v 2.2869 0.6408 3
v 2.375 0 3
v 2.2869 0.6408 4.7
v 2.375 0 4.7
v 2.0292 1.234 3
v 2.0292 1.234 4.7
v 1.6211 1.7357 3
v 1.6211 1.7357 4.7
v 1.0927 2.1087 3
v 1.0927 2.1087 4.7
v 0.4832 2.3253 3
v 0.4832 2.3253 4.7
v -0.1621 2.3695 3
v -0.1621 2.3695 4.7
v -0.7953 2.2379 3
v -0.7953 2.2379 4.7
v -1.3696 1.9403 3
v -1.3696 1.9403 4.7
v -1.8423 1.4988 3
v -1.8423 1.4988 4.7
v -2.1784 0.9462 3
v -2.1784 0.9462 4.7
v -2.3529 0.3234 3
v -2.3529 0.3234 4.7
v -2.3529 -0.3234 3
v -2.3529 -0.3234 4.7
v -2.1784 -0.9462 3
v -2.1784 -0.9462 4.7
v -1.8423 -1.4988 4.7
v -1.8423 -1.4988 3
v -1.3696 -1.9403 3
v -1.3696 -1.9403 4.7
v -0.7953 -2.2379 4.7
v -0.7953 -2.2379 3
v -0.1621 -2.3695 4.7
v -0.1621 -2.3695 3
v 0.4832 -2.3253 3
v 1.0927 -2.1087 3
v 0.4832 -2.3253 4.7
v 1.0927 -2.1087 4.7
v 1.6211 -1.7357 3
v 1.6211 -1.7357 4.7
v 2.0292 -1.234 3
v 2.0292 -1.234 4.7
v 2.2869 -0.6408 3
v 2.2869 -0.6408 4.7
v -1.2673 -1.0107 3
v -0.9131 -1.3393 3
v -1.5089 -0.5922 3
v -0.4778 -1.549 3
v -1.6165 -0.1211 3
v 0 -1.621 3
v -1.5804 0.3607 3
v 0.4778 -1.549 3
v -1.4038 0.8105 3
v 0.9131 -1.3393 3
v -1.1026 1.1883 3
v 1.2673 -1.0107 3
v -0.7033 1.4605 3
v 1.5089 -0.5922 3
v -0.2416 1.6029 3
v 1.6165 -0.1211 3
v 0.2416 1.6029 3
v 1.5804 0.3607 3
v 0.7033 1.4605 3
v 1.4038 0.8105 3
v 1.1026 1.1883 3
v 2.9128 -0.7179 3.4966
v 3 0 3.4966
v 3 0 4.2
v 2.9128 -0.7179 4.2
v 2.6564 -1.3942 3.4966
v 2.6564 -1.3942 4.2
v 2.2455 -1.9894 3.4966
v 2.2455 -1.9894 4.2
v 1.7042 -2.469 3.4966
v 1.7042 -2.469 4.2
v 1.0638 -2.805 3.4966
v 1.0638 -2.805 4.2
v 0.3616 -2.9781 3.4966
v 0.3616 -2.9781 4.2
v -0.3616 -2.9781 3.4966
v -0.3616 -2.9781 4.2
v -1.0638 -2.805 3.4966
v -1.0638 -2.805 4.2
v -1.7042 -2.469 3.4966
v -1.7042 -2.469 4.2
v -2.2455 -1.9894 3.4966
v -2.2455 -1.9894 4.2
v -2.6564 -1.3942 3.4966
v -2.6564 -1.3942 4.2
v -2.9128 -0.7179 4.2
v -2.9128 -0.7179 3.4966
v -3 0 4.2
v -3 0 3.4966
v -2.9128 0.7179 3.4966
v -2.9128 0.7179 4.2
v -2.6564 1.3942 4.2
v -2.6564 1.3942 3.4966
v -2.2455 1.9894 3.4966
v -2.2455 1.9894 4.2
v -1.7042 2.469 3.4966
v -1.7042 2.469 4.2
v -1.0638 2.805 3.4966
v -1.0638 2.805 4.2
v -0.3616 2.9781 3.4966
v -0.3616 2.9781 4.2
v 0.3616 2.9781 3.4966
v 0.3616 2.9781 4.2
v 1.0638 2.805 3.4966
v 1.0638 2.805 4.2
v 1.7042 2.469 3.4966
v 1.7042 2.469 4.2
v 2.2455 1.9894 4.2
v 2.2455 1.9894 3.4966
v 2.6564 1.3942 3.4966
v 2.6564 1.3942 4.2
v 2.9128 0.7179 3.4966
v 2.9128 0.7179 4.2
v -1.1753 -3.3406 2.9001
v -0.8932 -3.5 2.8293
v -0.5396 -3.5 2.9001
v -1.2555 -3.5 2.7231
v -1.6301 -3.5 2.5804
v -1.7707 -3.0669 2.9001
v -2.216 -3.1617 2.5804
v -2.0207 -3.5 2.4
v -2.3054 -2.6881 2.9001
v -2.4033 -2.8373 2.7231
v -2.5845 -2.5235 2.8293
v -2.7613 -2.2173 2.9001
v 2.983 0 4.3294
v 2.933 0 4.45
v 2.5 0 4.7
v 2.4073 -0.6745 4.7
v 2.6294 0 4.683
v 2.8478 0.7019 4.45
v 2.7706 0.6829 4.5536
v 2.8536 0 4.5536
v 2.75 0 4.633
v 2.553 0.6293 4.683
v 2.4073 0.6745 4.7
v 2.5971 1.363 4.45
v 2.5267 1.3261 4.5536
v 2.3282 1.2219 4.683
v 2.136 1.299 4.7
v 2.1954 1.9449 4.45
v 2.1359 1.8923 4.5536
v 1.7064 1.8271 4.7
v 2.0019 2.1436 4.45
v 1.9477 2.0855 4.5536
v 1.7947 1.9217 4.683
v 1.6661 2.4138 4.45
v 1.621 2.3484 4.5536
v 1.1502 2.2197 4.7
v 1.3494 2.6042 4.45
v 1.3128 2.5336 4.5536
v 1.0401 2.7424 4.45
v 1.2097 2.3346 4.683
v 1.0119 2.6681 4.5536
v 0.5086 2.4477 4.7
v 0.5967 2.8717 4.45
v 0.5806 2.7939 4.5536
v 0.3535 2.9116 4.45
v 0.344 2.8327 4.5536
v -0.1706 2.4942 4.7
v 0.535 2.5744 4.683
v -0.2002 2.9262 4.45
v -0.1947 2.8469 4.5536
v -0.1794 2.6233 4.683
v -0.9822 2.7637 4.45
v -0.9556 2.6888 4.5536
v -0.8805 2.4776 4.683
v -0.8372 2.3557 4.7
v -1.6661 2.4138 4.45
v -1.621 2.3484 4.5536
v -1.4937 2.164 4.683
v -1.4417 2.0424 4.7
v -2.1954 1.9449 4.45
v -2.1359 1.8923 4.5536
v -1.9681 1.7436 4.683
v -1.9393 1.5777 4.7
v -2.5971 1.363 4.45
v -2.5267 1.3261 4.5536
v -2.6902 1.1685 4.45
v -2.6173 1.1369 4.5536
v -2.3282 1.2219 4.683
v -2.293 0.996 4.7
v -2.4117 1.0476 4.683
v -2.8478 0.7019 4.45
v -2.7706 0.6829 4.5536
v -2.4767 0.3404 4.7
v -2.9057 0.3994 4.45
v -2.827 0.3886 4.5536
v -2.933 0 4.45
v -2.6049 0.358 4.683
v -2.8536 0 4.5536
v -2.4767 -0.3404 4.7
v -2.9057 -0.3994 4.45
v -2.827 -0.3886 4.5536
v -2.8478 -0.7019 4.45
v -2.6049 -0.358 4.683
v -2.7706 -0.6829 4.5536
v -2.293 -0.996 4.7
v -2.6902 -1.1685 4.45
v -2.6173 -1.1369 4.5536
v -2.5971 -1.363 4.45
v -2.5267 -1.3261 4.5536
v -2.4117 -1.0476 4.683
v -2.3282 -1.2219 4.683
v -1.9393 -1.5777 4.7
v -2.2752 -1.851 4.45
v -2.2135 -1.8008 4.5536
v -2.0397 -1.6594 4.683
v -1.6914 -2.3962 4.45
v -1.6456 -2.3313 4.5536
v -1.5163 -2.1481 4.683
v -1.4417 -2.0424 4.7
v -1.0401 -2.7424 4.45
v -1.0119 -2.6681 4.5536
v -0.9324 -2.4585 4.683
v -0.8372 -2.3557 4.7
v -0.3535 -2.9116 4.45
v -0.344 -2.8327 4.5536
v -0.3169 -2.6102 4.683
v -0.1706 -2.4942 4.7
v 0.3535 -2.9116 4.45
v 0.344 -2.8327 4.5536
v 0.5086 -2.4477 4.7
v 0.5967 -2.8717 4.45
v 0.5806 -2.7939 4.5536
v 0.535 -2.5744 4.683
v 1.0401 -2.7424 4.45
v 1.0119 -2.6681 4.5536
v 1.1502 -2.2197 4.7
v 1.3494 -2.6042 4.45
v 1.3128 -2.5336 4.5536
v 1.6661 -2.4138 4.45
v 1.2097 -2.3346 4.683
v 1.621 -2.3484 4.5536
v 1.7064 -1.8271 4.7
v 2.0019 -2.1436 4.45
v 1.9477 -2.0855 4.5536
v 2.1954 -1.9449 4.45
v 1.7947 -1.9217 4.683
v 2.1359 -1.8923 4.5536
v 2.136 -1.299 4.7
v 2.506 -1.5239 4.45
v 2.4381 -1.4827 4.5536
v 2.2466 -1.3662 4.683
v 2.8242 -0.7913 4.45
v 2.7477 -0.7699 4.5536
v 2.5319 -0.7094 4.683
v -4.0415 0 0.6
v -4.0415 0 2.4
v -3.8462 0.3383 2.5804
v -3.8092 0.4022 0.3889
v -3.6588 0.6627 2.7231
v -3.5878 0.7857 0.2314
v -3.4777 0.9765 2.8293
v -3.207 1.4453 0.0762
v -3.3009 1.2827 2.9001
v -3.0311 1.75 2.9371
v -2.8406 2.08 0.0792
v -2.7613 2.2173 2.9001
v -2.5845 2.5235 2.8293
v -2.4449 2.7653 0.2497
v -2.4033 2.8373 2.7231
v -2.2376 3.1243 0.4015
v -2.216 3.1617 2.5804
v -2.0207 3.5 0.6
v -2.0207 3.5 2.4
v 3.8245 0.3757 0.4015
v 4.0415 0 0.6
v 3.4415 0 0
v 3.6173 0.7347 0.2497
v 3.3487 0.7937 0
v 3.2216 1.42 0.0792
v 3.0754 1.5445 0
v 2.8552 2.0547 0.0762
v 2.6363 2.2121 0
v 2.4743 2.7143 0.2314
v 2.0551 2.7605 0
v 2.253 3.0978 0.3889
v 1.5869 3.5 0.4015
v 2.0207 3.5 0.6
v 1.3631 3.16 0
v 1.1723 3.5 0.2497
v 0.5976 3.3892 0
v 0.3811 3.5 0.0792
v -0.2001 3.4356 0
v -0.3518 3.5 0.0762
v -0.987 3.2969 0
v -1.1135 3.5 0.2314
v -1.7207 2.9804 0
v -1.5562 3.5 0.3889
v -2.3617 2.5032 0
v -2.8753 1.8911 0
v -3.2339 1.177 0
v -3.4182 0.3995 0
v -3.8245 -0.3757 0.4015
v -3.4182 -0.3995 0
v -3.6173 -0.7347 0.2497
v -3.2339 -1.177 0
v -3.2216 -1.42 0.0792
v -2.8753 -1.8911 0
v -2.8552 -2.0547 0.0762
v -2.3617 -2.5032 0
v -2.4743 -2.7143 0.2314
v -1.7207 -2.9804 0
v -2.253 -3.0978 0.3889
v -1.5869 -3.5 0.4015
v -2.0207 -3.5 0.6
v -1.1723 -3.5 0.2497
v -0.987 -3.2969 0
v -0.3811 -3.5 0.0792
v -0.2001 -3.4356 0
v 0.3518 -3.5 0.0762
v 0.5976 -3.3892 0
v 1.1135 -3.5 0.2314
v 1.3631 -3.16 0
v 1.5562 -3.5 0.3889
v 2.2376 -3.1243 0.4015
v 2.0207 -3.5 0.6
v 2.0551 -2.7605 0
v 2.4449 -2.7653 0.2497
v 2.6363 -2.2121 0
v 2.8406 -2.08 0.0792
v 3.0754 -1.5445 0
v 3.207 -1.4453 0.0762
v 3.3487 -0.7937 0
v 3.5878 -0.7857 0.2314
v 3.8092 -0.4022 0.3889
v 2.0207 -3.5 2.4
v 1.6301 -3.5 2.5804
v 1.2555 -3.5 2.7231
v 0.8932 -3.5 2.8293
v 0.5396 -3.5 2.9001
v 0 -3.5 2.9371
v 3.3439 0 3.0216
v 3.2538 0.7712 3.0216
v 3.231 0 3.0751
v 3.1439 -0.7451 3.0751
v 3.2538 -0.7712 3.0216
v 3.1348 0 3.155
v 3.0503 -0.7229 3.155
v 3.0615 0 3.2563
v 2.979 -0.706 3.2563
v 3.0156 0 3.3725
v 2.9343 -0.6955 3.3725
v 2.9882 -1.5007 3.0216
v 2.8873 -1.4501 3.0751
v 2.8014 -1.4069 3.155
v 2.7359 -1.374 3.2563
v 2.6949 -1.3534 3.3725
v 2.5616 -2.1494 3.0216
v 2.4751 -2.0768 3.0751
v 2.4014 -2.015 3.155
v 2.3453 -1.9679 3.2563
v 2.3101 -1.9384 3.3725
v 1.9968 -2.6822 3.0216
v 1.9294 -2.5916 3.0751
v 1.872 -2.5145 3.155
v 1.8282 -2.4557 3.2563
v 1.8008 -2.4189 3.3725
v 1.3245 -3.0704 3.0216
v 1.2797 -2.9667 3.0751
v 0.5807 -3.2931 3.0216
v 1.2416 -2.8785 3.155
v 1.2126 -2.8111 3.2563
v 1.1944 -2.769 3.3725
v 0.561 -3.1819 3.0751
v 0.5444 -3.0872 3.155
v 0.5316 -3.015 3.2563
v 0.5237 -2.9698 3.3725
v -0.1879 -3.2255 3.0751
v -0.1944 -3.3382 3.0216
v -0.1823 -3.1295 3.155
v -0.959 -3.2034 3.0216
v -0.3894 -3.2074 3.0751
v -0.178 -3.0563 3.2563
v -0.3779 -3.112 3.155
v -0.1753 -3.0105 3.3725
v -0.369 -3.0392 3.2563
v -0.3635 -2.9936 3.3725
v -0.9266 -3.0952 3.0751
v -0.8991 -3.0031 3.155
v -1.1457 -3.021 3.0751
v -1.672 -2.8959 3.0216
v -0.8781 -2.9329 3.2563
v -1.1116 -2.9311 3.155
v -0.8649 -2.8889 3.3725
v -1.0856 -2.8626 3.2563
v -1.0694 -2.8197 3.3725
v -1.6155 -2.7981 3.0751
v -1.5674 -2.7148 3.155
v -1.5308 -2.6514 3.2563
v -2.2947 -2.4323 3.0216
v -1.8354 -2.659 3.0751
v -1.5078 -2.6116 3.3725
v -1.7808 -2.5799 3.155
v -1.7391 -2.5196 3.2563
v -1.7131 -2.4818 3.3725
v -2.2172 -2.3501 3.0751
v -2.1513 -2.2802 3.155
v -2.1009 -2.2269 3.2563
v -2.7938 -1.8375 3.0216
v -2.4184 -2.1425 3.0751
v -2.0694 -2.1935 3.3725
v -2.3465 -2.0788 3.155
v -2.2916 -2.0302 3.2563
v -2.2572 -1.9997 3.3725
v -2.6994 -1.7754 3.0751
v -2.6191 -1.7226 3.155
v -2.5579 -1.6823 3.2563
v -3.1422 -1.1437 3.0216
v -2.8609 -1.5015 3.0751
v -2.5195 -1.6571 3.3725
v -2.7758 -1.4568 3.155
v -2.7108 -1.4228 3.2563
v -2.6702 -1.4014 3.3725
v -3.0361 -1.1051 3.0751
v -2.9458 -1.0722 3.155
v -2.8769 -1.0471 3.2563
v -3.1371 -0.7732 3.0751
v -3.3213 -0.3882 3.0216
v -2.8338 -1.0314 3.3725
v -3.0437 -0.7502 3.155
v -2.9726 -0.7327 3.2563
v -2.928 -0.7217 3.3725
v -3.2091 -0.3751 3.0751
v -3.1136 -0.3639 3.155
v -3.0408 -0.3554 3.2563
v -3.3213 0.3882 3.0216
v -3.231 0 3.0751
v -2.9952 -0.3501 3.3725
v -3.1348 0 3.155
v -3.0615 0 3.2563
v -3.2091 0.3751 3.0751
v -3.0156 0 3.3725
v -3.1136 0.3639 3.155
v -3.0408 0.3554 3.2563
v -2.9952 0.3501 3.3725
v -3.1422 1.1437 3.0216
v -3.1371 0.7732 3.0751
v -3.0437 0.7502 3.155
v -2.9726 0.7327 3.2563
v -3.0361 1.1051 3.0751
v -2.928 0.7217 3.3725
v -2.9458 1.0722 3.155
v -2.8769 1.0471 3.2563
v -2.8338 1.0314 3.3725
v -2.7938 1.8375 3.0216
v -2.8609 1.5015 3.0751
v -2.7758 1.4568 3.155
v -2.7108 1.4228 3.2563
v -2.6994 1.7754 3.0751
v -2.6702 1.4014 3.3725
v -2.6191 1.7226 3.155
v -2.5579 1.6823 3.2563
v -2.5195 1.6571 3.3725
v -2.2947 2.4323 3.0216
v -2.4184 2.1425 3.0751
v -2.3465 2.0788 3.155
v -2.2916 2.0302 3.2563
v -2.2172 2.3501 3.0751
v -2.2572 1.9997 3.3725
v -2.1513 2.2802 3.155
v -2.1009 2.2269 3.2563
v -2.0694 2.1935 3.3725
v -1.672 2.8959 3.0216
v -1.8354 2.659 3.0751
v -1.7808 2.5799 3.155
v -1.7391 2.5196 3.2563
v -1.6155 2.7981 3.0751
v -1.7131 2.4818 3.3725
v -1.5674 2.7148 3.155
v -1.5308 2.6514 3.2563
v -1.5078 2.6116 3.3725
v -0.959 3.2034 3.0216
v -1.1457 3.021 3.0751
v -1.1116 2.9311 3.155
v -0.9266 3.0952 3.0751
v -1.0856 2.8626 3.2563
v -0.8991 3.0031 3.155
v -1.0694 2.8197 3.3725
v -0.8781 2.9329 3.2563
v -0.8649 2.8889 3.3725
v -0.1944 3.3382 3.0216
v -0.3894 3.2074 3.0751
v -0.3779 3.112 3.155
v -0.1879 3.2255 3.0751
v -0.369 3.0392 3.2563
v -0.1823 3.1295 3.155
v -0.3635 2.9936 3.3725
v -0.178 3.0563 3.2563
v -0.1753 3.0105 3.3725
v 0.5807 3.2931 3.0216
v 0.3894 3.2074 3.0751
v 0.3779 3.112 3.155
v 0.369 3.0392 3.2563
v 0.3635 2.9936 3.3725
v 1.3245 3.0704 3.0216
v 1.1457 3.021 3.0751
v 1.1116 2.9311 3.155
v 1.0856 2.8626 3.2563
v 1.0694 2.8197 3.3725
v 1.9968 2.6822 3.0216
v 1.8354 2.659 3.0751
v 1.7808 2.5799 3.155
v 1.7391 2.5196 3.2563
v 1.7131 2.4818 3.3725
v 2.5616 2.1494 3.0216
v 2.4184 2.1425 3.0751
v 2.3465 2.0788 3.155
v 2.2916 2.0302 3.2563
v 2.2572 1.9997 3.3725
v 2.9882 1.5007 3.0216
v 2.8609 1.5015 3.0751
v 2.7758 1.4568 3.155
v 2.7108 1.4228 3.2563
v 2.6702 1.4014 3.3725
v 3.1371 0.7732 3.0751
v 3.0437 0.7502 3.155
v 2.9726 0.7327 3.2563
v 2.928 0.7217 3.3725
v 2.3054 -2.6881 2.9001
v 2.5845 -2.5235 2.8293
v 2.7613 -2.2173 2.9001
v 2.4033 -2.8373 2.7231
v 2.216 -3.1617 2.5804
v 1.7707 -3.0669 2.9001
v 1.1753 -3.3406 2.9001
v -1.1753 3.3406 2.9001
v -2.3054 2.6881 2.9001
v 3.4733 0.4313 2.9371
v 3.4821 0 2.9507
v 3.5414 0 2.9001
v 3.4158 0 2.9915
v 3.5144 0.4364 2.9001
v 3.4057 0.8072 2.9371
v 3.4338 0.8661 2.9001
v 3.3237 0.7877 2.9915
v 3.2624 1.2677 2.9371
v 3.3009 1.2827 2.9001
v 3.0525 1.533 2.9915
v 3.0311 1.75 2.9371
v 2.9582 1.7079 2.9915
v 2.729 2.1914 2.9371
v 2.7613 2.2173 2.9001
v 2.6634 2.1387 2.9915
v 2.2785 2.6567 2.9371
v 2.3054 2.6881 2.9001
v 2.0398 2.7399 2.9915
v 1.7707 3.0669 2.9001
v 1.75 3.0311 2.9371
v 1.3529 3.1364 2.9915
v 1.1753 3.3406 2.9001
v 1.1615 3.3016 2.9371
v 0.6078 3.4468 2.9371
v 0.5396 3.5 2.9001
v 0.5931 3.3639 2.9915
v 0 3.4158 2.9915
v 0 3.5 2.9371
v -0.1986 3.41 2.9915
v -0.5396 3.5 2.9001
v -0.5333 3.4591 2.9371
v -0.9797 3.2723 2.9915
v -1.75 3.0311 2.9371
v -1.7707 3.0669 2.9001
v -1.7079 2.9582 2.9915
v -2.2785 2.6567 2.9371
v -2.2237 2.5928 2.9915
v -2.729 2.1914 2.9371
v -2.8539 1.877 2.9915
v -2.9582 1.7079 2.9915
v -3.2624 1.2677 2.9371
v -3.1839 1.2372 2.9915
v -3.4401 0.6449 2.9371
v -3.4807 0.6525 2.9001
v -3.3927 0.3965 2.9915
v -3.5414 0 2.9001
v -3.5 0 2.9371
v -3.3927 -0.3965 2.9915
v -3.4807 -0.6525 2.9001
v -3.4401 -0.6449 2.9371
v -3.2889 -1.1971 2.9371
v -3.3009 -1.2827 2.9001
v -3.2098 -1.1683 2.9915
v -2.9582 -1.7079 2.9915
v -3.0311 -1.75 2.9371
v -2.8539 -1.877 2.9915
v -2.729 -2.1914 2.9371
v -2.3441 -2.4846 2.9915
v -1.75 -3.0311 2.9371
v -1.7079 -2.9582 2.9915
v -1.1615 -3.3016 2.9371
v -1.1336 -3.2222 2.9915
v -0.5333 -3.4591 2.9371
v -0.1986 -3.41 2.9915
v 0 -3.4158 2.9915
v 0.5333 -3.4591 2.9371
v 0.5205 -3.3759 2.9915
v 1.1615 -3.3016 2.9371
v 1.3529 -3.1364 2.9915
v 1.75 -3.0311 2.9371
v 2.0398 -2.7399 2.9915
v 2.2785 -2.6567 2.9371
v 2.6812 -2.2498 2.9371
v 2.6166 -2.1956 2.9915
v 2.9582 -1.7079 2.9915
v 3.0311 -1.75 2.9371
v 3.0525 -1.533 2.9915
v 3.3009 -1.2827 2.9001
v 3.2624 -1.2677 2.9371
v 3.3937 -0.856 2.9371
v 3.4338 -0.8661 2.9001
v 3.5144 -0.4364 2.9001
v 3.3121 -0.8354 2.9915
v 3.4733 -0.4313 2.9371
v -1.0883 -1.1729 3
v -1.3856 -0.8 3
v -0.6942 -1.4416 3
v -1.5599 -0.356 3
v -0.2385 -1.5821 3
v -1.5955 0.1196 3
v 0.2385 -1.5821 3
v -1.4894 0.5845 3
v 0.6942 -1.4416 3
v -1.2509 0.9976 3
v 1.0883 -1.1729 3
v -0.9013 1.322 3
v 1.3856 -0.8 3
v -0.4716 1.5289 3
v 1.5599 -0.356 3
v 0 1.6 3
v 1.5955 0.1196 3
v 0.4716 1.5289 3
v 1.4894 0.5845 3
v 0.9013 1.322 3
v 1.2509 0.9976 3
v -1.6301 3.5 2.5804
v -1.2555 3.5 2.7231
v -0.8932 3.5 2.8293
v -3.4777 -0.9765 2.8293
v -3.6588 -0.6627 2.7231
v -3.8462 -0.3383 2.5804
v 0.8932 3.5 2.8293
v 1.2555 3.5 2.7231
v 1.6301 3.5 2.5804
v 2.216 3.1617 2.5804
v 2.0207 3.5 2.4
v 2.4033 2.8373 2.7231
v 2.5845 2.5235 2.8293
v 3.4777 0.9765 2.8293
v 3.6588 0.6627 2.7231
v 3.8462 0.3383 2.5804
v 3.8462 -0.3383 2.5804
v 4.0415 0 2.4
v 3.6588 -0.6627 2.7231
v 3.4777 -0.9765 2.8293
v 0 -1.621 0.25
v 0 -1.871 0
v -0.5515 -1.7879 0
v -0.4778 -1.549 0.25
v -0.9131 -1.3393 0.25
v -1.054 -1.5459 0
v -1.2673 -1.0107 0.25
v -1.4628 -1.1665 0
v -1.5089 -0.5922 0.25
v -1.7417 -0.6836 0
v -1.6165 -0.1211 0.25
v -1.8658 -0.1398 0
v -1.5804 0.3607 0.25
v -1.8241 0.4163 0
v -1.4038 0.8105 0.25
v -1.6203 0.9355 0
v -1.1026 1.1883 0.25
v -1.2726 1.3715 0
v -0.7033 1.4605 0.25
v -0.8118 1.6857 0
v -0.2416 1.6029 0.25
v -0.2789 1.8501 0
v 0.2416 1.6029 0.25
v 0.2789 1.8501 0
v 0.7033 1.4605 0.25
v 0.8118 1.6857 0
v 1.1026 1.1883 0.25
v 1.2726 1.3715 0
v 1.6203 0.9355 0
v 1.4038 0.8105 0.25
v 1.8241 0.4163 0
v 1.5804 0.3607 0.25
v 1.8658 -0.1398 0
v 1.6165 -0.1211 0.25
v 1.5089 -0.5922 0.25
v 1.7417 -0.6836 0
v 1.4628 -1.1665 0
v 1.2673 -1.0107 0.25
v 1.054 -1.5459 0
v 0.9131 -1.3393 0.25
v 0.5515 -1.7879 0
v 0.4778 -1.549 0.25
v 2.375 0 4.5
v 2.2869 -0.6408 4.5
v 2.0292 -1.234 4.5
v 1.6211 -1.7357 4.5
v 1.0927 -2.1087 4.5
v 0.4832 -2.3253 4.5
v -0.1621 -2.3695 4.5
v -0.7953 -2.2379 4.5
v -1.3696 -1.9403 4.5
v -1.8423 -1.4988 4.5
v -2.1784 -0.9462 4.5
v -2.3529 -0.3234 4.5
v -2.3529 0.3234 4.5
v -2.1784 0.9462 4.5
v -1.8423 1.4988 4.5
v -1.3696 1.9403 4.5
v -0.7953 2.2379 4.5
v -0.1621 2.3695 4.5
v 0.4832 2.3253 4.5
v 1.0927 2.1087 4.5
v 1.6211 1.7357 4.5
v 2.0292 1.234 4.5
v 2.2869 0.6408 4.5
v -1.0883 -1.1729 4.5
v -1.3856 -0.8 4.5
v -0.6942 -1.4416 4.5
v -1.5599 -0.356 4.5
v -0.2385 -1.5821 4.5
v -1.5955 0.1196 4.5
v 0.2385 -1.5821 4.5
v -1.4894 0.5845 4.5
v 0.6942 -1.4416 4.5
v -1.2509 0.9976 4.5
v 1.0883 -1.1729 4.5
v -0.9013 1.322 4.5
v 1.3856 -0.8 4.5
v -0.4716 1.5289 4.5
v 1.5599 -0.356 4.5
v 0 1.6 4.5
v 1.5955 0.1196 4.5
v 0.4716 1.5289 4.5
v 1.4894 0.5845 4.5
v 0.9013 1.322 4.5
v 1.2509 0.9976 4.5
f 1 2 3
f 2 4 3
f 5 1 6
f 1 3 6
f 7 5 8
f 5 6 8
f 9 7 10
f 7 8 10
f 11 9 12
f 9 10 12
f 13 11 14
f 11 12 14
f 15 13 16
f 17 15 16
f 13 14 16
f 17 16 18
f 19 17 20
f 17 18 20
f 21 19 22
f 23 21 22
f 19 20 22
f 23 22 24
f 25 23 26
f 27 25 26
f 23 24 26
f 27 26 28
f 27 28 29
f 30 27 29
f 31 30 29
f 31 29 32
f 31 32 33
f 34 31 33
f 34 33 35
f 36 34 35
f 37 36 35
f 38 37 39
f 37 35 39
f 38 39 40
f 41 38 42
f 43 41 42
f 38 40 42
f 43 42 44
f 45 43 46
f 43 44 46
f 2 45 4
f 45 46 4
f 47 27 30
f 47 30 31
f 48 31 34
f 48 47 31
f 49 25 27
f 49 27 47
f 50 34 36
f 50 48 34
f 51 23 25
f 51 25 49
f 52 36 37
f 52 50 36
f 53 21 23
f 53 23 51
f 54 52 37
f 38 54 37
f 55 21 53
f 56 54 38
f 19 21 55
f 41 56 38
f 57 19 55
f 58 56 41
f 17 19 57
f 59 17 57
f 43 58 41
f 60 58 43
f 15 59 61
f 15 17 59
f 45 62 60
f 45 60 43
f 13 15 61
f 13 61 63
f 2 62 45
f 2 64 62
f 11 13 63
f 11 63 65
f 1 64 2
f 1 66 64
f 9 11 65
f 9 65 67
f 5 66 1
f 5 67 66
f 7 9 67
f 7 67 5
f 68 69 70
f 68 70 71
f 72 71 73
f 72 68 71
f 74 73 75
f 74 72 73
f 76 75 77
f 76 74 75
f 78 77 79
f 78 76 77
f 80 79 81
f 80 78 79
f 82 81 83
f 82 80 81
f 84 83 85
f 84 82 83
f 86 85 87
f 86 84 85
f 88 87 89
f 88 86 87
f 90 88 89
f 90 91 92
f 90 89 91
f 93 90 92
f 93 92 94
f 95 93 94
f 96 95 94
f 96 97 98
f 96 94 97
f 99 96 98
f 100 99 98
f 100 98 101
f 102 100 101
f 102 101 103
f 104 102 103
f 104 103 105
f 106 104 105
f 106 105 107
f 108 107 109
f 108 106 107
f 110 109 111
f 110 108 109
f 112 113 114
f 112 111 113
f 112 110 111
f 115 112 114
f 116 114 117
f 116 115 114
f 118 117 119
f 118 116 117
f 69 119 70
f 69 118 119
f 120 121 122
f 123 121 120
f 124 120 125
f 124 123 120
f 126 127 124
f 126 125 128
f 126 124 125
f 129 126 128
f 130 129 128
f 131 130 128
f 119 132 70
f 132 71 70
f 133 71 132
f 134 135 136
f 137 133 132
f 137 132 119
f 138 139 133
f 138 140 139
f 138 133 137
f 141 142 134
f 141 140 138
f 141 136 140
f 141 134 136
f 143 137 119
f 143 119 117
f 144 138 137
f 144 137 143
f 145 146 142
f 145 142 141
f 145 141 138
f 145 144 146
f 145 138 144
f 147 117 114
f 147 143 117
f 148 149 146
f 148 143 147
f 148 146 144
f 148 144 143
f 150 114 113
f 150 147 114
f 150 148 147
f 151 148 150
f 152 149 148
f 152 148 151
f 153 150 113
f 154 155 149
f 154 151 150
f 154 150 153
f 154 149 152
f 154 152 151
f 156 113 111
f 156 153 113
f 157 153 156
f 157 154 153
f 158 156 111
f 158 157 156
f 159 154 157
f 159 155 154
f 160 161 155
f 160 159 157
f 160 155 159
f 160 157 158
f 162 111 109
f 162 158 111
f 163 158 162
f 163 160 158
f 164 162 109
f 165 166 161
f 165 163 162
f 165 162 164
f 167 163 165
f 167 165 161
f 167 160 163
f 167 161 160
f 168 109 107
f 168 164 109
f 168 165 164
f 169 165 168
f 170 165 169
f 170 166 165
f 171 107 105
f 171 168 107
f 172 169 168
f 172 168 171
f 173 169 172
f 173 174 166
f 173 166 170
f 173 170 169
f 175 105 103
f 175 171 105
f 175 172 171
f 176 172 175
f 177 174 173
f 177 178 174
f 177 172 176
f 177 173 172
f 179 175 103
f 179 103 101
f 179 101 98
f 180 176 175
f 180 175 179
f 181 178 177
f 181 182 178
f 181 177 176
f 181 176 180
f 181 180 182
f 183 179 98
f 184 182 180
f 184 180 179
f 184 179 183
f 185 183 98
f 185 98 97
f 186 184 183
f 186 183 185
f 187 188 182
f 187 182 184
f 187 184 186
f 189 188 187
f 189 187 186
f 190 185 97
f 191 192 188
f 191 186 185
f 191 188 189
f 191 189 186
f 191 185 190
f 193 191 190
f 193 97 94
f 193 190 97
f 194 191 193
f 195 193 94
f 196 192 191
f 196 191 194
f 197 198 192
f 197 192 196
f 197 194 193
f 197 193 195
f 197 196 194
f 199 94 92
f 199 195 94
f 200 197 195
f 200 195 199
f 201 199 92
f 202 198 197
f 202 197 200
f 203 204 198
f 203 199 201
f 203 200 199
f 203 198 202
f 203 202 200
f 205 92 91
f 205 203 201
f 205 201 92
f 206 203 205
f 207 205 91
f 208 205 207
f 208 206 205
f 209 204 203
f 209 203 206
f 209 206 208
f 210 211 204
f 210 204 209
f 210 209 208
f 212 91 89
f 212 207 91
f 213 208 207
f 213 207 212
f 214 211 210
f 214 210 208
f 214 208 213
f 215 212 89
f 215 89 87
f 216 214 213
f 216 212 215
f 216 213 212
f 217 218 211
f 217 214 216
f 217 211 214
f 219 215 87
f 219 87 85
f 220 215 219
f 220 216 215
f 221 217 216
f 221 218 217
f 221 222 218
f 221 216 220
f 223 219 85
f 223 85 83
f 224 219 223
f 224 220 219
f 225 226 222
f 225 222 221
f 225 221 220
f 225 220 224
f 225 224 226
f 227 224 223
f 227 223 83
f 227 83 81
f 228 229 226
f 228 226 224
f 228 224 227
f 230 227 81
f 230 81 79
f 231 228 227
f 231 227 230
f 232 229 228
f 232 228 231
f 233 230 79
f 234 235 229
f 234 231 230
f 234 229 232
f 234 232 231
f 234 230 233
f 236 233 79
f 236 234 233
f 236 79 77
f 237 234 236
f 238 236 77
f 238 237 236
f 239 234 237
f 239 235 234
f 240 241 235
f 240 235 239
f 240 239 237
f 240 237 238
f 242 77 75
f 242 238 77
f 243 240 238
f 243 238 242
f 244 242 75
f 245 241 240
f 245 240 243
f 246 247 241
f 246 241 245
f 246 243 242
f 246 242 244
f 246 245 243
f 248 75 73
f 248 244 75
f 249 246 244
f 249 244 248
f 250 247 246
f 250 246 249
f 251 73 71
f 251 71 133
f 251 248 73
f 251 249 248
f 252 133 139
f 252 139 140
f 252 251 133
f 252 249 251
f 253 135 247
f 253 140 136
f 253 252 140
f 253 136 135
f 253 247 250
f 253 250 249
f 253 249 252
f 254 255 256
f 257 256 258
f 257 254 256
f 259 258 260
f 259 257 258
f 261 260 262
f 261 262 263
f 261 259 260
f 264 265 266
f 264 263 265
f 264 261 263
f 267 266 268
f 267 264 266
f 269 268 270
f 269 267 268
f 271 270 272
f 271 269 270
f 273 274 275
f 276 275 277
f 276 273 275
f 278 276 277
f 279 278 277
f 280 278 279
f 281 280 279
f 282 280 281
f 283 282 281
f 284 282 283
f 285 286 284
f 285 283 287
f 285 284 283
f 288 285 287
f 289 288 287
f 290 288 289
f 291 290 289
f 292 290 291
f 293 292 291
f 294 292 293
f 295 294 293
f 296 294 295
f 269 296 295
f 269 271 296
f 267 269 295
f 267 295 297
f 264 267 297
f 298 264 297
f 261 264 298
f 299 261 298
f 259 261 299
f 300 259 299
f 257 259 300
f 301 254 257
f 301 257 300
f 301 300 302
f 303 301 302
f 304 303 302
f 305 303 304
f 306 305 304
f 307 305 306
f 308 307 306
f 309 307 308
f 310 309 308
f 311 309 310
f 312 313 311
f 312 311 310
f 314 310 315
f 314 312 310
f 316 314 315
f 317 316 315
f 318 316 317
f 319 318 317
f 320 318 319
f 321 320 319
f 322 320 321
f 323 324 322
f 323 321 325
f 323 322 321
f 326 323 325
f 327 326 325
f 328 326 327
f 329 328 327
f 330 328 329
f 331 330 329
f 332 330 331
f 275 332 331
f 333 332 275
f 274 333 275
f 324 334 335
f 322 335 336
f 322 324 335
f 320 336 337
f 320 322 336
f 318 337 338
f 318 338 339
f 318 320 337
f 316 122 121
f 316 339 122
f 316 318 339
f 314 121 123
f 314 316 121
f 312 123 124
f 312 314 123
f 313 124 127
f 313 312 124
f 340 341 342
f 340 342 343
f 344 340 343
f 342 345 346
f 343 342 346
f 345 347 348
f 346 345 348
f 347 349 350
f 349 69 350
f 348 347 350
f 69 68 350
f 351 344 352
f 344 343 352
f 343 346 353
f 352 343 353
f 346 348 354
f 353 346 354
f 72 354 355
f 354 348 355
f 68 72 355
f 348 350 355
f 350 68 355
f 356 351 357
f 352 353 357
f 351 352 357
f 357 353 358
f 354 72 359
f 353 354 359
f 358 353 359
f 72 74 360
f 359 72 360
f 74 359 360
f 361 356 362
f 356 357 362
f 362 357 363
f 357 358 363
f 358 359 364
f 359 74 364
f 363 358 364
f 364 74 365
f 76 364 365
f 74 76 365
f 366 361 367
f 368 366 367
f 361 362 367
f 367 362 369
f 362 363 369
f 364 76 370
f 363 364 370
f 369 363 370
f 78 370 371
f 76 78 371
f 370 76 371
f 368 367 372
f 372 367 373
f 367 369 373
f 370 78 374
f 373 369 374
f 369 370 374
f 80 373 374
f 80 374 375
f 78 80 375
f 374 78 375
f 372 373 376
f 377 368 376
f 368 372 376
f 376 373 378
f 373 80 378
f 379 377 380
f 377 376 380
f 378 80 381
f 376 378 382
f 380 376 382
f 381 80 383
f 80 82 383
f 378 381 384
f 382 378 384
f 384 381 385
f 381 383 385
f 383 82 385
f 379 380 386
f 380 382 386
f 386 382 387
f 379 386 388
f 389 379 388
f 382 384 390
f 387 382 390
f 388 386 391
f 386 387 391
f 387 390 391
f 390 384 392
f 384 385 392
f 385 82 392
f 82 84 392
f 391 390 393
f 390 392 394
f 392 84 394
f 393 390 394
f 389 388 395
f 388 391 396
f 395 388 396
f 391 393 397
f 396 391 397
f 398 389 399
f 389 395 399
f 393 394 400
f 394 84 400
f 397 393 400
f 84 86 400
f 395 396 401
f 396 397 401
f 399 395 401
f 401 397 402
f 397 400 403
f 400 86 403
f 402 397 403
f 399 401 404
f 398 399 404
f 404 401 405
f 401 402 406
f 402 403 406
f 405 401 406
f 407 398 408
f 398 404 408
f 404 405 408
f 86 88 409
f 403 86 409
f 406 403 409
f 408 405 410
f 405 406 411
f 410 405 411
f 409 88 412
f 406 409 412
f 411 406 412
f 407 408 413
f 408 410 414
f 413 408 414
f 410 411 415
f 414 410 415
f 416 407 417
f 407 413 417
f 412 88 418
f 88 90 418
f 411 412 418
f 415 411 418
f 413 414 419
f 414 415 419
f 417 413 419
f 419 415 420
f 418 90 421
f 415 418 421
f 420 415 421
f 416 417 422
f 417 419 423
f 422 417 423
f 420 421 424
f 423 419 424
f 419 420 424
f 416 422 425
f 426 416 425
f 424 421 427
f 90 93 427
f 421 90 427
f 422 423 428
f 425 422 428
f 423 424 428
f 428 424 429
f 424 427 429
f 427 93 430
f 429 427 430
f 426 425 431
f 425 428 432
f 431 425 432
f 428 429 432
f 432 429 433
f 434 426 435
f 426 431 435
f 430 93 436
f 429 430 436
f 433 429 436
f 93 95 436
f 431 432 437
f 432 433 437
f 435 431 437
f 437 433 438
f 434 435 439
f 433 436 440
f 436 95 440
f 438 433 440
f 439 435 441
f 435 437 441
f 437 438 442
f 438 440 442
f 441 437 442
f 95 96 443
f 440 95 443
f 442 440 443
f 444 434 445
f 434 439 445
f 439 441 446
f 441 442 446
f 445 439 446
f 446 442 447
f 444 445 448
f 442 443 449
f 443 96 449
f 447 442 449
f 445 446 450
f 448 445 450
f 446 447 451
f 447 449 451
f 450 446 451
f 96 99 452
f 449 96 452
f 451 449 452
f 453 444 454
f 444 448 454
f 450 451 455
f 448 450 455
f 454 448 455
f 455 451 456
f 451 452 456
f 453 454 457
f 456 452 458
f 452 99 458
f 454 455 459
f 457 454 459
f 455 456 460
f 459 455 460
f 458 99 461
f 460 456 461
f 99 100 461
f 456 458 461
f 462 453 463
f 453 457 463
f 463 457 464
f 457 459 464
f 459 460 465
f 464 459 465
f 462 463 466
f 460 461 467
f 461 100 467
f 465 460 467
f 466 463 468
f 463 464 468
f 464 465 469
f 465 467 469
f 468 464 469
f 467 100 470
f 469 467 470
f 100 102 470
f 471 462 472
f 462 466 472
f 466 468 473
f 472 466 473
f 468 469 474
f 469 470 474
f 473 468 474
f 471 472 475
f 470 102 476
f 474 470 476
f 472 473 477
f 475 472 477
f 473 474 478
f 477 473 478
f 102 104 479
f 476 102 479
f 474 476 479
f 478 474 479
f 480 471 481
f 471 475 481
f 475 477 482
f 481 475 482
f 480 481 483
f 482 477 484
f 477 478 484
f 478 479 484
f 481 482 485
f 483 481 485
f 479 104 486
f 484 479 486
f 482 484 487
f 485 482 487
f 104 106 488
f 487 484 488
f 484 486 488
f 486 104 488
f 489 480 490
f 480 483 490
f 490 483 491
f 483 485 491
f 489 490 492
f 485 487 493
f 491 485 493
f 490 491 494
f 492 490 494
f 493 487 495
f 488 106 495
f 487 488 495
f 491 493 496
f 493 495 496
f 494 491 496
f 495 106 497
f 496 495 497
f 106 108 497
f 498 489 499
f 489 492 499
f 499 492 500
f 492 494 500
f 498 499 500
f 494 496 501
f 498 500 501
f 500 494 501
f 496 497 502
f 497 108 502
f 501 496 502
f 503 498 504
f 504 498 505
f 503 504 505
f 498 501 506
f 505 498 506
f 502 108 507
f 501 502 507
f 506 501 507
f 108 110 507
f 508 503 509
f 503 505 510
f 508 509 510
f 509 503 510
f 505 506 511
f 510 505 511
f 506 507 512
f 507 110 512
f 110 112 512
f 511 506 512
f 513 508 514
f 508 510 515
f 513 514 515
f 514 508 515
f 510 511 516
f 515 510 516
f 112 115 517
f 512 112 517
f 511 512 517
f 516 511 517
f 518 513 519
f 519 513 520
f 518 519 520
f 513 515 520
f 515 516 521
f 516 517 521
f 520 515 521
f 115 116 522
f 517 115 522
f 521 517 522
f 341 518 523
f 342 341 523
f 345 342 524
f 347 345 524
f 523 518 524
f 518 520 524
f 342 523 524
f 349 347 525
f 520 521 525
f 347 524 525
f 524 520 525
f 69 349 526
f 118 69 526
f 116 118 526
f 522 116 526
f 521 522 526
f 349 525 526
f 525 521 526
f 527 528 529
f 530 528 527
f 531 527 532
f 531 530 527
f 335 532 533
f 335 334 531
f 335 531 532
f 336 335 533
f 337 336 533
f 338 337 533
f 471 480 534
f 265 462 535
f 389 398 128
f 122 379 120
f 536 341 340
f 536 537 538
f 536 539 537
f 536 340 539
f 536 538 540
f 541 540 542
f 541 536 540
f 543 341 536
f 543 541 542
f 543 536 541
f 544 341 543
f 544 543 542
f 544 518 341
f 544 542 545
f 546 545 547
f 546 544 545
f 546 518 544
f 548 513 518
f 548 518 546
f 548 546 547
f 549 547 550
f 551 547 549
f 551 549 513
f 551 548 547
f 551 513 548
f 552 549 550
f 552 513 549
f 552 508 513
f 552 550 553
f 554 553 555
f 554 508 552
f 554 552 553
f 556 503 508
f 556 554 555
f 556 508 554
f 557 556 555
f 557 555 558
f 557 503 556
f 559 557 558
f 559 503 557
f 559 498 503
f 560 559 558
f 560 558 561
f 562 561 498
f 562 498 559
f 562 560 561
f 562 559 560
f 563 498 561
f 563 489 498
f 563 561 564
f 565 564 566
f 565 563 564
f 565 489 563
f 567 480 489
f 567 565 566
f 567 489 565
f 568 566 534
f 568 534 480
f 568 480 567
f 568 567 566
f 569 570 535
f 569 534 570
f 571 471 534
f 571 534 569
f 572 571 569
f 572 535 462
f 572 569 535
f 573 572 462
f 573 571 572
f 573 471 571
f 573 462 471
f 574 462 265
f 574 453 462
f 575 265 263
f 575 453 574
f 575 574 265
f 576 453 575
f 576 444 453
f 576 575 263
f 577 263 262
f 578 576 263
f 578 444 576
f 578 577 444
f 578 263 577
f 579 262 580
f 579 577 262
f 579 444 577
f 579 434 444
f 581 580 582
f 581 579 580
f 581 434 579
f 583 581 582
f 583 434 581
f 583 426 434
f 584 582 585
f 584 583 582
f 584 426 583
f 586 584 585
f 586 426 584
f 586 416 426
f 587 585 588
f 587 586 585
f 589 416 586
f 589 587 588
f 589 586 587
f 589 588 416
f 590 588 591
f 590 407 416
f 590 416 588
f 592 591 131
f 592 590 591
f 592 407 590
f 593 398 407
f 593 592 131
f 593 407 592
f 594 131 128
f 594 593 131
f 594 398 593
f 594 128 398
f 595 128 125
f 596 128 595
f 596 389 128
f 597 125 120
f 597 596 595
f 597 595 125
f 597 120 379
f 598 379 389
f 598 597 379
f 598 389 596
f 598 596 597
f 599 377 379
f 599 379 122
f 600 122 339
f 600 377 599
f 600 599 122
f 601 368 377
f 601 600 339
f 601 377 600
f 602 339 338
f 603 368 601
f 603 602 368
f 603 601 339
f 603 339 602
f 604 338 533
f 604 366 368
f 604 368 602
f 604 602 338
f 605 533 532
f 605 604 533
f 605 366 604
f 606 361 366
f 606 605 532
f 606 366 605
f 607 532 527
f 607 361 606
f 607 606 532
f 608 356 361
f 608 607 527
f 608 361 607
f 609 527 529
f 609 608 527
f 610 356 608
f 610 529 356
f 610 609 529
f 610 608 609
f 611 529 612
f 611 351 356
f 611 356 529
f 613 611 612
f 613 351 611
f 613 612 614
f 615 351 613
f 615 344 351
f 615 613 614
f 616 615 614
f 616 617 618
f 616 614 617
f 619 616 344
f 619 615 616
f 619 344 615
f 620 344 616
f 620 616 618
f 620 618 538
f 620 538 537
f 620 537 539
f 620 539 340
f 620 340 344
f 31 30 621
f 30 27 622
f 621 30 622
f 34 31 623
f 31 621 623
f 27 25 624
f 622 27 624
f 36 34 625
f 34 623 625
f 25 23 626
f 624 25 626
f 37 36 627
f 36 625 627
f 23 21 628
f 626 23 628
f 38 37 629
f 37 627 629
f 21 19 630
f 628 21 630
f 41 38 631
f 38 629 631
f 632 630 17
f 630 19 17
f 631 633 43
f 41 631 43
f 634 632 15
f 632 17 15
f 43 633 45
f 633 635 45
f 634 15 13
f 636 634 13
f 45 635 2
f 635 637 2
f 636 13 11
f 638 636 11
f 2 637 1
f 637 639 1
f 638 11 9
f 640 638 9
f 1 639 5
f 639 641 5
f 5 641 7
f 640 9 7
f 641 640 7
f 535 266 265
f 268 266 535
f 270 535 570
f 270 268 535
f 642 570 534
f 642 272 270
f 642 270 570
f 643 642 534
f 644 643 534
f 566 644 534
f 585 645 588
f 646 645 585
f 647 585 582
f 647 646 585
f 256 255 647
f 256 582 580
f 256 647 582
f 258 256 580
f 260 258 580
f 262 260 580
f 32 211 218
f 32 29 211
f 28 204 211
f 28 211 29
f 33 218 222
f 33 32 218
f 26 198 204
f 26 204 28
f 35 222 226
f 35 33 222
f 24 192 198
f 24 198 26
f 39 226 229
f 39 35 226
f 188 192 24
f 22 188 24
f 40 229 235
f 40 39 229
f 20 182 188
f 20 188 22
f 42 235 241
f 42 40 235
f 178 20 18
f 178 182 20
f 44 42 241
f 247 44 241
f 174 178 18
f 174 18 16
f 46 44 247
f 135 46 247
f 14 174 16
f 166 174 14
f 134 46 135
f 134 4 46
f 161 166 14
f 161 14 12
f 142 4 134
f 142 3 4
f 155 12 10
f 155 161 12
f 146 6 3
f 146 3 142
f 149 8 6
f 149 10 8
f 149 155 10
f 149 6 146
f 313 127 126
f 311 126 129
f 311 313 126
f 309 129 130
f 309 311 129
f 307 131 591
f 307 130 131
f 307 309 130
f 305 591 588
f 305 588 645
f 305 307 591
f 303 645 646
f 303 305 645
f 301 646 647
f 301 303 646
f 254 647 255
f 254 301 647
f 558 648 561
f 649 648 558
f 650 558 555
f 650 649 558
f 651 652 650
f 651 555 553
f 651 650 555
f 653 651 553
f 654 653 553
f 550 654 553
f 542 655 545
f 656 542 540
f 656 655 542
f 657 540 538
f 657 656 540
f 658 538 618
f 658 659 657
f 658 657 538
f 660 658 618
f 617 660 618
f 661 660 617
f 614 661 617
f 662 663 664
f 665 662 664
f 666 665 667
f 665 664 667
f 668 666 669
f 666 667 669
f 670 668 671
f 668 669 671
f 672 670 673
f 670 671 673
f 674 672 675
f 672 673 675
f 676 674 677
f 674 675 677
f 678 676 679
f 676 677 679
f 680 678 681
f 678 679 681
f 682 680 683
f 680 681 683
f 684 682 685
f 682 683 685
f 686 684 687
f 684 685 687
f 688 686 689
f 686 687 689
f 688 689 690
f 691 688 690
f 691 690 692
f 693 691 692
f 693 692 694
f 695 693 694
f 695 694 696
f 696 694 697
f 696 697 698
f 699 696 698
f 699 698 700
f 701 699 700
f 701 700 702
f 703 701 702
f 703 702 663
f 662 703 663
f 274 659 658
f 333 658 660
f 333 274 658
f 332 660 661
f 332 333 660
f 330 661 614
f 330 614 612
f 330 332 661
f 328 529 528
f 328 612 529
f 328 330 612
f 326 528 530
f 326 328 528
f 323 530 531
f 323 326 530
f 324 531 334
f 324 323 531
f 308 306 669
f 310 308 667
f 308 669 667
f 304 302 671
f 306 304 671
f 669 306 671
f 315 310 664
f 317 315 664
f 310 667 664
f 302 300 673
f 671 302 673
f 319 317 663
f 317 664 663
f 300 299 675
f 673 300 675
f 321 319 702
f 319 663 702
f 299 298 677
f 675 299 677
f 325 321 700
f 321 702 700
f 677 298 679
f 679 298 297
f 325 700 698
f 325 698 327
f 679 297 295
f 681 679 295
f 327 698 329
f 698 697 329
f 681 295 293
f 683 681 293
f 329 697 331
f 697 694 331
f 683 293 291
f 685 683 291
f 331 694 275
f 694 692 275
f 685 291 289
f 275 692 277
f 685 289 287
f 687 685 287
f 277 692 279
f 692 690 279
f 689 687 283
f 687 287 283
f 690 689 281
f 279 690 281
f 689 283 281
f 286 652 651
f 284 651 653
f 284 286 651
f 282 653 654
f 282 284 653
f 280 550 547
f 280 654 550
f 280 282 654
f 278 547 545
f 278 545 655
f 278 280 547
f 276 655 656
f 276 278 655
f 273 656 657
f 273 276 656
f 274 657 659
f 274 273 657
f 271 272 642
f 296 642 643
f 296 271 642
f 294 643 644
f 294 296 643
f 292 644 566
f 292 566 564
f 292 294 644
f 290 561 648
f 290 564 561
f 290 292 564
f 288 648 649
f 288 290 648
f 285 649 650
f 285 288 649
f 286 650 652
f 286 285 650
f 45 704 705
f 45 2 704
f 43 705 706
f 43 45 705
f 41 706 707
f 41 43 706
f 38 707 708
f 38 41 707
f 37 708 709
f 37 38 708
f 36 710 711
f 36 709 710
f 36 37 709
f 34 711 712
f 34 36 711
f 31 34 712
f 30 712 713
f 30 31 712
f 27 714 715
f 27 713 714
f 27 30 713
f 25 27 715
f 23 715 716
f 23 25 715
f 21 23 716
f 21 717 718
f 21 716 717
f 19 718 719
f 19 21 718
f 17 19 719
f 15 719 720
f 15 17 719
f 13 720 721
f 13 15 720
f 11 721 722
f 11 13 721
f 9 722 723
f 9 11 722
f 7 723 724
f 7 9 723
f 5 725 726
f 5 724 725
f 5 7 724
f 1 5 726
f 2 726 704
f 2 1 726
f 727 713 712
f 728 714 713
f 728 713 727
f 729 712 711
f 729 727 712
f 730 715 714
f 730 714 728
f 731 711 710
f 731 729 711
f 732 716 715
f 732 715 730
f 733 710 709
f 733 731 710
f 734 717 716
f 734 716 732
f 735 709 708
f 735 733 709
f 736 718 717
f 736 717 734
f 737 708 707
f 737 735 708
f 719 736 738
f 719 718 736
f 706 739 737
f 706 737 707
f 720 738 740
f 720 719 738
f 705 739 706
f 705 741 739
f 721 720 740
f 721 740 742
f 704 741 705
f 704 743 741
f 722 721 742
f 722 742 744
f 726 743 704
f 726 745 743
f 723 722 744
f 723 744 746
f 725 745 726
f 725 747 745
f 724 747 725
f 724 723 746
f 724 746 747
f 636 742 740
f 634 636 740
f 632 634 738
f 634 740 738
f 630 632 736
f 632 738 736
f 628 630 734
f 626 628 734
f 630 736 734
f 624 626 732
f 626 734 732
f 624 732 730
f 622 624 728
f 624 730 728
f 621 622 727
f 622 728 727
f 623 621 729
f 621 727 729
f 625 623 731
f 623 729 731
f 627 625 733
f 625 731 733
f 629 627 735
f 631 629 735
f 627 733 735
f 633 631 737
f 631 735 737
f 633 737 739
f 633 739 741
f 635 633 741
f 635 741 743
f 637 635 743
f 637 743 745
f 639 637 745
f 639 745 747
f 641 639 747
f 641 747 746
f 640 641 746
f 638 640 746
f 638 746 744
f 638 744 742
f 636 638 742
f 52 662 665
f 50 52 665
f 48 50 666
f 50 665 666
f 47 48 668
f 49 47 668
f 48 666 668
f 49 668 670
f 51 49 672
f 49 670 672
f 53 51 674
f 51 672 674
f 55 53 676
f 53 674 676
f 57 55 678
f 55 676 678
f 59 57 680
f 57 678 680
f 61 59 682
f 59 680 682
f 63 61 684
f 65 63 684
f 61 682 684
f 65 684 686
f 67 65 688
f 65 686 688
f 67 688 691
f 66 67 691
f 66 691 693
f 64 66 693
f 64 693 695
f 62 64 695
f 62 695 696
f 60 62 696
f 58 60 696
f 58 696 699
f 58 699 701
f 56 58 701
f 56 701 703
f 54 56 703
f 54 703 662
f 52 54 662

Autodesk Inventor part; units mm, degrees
ref_plane "YZ Plane" through (0, 0, 0) normal (1, 0, 0) x (0, 1, 0)
ref_plane "XZ Plane" through (0, 0, 0) normal (0, 1, 0) x (-1, 0, 0)
ref_plane "XY Plane" through (0, 0, 0) normal (0, 0, 1) x (1, 0, 0)
sketch "Sketch1" plane through (0, 0, 0) normal (0, 0, 1) x (1, 0, 0)
  circle A0 centre (0, 0) radius 4.041452
  line L0 (-2.020726, 3.5) -> (2.020726, 3.5)
  line L1 (2.020726, 3.5) -> (4.041452, 0)
  line L2 (4.041452, 0) -> (2.020726, -3.5)
  line L3 (2.020726, -3.5) -> (-2.020726, -3.5)
  line L4 (-2.020726, -3.5) -> (-4.041452, 0)
  line L5 (-4.041452, 0) -> (-2.020726, 3.5)
  point P0 (-4.041452, 0)
  point P1 (-4.041452, 0)
  point P2 (4.041452, 0)
  point P3 (4.041452, 0)
  dimension "d0" = 7
extrude "Extrusion1" add sketch "Sketch1" along normal blind 3
chamfer "Chamfer1" distance 0.6 angle 45 2 edges at (-4.0415, 0, 0) (-4.0415, 0, 3)
extrude "Extrusion2" cut sketch "Sketch1" along normal through all contours L1 A0 | A0 L2 | L0 A0 | A0 L3 | L5 A0 | A0 L4
sketch "Sketch2" plane through (0, 0, 3) normal (0, 0, 1) x (1, 0, 0)
  circle A0 centre (0, 0) radius 3.441452
  circle A1 centre (0, 0) radius 3
  dimension "d9" = 6
extrude "Extrusion3" add sketch "Sketch2" along normal blind 1.7 contours A1
fillet "Fillet1" radius 0.5 3 edges at (-3, 0, 3) (-3.4415, 0, 3) (-3, 0, 4.7)
sketch "Sketch3" plane through (0, 0, 4.7) normal (0, 0, 1) x (1, 0, 0)
  circle A0 centre (0, 0) radius 2.375
  dimension "d13" = 4.75
extrude "Extrusion4" cut sketch "Sketch3" against normal blind 1.7
sketch "Sketch4" plane through (0, 0, 3) normal (0, 0, 1) x (1, 0, 0)
  circle A0 centre (0, 0) radius 2.375 projected
extrude "Extrusion5" add sketch "Sketch4" along normal blind 1.5 separate body
sketch "Sketch5" plane through (0, 0, 4.5) normal (0, 0, 1) x (1, 0, 0)
  circle A0 centre (0, 0) radius 2.375 projected
hole "Hole1" at (0, 0, 4.5) direction (0, 0, -1) diameter 3.242 end through all bodies 1 thread size "M4x0.7" class "6H" standard "ANSI Metric M Profile"
sketch "Sketch6" plane through (0, 0, 3) normal (0, 0, -1) x (-1, 0, 0)
  circle A0 centre (0, 0) radius 1.621 projected
hole "Hole2" at (0, 0, 3) direction (0, 0, 1) diameter 3.2 end through all bodies 2
chamfer "Chamfer2" distance 0.25 angle 45 1 edges at (0, 1.621, 0)
properties part number "M4 LOCKNUT" material "Stainless Steel"
